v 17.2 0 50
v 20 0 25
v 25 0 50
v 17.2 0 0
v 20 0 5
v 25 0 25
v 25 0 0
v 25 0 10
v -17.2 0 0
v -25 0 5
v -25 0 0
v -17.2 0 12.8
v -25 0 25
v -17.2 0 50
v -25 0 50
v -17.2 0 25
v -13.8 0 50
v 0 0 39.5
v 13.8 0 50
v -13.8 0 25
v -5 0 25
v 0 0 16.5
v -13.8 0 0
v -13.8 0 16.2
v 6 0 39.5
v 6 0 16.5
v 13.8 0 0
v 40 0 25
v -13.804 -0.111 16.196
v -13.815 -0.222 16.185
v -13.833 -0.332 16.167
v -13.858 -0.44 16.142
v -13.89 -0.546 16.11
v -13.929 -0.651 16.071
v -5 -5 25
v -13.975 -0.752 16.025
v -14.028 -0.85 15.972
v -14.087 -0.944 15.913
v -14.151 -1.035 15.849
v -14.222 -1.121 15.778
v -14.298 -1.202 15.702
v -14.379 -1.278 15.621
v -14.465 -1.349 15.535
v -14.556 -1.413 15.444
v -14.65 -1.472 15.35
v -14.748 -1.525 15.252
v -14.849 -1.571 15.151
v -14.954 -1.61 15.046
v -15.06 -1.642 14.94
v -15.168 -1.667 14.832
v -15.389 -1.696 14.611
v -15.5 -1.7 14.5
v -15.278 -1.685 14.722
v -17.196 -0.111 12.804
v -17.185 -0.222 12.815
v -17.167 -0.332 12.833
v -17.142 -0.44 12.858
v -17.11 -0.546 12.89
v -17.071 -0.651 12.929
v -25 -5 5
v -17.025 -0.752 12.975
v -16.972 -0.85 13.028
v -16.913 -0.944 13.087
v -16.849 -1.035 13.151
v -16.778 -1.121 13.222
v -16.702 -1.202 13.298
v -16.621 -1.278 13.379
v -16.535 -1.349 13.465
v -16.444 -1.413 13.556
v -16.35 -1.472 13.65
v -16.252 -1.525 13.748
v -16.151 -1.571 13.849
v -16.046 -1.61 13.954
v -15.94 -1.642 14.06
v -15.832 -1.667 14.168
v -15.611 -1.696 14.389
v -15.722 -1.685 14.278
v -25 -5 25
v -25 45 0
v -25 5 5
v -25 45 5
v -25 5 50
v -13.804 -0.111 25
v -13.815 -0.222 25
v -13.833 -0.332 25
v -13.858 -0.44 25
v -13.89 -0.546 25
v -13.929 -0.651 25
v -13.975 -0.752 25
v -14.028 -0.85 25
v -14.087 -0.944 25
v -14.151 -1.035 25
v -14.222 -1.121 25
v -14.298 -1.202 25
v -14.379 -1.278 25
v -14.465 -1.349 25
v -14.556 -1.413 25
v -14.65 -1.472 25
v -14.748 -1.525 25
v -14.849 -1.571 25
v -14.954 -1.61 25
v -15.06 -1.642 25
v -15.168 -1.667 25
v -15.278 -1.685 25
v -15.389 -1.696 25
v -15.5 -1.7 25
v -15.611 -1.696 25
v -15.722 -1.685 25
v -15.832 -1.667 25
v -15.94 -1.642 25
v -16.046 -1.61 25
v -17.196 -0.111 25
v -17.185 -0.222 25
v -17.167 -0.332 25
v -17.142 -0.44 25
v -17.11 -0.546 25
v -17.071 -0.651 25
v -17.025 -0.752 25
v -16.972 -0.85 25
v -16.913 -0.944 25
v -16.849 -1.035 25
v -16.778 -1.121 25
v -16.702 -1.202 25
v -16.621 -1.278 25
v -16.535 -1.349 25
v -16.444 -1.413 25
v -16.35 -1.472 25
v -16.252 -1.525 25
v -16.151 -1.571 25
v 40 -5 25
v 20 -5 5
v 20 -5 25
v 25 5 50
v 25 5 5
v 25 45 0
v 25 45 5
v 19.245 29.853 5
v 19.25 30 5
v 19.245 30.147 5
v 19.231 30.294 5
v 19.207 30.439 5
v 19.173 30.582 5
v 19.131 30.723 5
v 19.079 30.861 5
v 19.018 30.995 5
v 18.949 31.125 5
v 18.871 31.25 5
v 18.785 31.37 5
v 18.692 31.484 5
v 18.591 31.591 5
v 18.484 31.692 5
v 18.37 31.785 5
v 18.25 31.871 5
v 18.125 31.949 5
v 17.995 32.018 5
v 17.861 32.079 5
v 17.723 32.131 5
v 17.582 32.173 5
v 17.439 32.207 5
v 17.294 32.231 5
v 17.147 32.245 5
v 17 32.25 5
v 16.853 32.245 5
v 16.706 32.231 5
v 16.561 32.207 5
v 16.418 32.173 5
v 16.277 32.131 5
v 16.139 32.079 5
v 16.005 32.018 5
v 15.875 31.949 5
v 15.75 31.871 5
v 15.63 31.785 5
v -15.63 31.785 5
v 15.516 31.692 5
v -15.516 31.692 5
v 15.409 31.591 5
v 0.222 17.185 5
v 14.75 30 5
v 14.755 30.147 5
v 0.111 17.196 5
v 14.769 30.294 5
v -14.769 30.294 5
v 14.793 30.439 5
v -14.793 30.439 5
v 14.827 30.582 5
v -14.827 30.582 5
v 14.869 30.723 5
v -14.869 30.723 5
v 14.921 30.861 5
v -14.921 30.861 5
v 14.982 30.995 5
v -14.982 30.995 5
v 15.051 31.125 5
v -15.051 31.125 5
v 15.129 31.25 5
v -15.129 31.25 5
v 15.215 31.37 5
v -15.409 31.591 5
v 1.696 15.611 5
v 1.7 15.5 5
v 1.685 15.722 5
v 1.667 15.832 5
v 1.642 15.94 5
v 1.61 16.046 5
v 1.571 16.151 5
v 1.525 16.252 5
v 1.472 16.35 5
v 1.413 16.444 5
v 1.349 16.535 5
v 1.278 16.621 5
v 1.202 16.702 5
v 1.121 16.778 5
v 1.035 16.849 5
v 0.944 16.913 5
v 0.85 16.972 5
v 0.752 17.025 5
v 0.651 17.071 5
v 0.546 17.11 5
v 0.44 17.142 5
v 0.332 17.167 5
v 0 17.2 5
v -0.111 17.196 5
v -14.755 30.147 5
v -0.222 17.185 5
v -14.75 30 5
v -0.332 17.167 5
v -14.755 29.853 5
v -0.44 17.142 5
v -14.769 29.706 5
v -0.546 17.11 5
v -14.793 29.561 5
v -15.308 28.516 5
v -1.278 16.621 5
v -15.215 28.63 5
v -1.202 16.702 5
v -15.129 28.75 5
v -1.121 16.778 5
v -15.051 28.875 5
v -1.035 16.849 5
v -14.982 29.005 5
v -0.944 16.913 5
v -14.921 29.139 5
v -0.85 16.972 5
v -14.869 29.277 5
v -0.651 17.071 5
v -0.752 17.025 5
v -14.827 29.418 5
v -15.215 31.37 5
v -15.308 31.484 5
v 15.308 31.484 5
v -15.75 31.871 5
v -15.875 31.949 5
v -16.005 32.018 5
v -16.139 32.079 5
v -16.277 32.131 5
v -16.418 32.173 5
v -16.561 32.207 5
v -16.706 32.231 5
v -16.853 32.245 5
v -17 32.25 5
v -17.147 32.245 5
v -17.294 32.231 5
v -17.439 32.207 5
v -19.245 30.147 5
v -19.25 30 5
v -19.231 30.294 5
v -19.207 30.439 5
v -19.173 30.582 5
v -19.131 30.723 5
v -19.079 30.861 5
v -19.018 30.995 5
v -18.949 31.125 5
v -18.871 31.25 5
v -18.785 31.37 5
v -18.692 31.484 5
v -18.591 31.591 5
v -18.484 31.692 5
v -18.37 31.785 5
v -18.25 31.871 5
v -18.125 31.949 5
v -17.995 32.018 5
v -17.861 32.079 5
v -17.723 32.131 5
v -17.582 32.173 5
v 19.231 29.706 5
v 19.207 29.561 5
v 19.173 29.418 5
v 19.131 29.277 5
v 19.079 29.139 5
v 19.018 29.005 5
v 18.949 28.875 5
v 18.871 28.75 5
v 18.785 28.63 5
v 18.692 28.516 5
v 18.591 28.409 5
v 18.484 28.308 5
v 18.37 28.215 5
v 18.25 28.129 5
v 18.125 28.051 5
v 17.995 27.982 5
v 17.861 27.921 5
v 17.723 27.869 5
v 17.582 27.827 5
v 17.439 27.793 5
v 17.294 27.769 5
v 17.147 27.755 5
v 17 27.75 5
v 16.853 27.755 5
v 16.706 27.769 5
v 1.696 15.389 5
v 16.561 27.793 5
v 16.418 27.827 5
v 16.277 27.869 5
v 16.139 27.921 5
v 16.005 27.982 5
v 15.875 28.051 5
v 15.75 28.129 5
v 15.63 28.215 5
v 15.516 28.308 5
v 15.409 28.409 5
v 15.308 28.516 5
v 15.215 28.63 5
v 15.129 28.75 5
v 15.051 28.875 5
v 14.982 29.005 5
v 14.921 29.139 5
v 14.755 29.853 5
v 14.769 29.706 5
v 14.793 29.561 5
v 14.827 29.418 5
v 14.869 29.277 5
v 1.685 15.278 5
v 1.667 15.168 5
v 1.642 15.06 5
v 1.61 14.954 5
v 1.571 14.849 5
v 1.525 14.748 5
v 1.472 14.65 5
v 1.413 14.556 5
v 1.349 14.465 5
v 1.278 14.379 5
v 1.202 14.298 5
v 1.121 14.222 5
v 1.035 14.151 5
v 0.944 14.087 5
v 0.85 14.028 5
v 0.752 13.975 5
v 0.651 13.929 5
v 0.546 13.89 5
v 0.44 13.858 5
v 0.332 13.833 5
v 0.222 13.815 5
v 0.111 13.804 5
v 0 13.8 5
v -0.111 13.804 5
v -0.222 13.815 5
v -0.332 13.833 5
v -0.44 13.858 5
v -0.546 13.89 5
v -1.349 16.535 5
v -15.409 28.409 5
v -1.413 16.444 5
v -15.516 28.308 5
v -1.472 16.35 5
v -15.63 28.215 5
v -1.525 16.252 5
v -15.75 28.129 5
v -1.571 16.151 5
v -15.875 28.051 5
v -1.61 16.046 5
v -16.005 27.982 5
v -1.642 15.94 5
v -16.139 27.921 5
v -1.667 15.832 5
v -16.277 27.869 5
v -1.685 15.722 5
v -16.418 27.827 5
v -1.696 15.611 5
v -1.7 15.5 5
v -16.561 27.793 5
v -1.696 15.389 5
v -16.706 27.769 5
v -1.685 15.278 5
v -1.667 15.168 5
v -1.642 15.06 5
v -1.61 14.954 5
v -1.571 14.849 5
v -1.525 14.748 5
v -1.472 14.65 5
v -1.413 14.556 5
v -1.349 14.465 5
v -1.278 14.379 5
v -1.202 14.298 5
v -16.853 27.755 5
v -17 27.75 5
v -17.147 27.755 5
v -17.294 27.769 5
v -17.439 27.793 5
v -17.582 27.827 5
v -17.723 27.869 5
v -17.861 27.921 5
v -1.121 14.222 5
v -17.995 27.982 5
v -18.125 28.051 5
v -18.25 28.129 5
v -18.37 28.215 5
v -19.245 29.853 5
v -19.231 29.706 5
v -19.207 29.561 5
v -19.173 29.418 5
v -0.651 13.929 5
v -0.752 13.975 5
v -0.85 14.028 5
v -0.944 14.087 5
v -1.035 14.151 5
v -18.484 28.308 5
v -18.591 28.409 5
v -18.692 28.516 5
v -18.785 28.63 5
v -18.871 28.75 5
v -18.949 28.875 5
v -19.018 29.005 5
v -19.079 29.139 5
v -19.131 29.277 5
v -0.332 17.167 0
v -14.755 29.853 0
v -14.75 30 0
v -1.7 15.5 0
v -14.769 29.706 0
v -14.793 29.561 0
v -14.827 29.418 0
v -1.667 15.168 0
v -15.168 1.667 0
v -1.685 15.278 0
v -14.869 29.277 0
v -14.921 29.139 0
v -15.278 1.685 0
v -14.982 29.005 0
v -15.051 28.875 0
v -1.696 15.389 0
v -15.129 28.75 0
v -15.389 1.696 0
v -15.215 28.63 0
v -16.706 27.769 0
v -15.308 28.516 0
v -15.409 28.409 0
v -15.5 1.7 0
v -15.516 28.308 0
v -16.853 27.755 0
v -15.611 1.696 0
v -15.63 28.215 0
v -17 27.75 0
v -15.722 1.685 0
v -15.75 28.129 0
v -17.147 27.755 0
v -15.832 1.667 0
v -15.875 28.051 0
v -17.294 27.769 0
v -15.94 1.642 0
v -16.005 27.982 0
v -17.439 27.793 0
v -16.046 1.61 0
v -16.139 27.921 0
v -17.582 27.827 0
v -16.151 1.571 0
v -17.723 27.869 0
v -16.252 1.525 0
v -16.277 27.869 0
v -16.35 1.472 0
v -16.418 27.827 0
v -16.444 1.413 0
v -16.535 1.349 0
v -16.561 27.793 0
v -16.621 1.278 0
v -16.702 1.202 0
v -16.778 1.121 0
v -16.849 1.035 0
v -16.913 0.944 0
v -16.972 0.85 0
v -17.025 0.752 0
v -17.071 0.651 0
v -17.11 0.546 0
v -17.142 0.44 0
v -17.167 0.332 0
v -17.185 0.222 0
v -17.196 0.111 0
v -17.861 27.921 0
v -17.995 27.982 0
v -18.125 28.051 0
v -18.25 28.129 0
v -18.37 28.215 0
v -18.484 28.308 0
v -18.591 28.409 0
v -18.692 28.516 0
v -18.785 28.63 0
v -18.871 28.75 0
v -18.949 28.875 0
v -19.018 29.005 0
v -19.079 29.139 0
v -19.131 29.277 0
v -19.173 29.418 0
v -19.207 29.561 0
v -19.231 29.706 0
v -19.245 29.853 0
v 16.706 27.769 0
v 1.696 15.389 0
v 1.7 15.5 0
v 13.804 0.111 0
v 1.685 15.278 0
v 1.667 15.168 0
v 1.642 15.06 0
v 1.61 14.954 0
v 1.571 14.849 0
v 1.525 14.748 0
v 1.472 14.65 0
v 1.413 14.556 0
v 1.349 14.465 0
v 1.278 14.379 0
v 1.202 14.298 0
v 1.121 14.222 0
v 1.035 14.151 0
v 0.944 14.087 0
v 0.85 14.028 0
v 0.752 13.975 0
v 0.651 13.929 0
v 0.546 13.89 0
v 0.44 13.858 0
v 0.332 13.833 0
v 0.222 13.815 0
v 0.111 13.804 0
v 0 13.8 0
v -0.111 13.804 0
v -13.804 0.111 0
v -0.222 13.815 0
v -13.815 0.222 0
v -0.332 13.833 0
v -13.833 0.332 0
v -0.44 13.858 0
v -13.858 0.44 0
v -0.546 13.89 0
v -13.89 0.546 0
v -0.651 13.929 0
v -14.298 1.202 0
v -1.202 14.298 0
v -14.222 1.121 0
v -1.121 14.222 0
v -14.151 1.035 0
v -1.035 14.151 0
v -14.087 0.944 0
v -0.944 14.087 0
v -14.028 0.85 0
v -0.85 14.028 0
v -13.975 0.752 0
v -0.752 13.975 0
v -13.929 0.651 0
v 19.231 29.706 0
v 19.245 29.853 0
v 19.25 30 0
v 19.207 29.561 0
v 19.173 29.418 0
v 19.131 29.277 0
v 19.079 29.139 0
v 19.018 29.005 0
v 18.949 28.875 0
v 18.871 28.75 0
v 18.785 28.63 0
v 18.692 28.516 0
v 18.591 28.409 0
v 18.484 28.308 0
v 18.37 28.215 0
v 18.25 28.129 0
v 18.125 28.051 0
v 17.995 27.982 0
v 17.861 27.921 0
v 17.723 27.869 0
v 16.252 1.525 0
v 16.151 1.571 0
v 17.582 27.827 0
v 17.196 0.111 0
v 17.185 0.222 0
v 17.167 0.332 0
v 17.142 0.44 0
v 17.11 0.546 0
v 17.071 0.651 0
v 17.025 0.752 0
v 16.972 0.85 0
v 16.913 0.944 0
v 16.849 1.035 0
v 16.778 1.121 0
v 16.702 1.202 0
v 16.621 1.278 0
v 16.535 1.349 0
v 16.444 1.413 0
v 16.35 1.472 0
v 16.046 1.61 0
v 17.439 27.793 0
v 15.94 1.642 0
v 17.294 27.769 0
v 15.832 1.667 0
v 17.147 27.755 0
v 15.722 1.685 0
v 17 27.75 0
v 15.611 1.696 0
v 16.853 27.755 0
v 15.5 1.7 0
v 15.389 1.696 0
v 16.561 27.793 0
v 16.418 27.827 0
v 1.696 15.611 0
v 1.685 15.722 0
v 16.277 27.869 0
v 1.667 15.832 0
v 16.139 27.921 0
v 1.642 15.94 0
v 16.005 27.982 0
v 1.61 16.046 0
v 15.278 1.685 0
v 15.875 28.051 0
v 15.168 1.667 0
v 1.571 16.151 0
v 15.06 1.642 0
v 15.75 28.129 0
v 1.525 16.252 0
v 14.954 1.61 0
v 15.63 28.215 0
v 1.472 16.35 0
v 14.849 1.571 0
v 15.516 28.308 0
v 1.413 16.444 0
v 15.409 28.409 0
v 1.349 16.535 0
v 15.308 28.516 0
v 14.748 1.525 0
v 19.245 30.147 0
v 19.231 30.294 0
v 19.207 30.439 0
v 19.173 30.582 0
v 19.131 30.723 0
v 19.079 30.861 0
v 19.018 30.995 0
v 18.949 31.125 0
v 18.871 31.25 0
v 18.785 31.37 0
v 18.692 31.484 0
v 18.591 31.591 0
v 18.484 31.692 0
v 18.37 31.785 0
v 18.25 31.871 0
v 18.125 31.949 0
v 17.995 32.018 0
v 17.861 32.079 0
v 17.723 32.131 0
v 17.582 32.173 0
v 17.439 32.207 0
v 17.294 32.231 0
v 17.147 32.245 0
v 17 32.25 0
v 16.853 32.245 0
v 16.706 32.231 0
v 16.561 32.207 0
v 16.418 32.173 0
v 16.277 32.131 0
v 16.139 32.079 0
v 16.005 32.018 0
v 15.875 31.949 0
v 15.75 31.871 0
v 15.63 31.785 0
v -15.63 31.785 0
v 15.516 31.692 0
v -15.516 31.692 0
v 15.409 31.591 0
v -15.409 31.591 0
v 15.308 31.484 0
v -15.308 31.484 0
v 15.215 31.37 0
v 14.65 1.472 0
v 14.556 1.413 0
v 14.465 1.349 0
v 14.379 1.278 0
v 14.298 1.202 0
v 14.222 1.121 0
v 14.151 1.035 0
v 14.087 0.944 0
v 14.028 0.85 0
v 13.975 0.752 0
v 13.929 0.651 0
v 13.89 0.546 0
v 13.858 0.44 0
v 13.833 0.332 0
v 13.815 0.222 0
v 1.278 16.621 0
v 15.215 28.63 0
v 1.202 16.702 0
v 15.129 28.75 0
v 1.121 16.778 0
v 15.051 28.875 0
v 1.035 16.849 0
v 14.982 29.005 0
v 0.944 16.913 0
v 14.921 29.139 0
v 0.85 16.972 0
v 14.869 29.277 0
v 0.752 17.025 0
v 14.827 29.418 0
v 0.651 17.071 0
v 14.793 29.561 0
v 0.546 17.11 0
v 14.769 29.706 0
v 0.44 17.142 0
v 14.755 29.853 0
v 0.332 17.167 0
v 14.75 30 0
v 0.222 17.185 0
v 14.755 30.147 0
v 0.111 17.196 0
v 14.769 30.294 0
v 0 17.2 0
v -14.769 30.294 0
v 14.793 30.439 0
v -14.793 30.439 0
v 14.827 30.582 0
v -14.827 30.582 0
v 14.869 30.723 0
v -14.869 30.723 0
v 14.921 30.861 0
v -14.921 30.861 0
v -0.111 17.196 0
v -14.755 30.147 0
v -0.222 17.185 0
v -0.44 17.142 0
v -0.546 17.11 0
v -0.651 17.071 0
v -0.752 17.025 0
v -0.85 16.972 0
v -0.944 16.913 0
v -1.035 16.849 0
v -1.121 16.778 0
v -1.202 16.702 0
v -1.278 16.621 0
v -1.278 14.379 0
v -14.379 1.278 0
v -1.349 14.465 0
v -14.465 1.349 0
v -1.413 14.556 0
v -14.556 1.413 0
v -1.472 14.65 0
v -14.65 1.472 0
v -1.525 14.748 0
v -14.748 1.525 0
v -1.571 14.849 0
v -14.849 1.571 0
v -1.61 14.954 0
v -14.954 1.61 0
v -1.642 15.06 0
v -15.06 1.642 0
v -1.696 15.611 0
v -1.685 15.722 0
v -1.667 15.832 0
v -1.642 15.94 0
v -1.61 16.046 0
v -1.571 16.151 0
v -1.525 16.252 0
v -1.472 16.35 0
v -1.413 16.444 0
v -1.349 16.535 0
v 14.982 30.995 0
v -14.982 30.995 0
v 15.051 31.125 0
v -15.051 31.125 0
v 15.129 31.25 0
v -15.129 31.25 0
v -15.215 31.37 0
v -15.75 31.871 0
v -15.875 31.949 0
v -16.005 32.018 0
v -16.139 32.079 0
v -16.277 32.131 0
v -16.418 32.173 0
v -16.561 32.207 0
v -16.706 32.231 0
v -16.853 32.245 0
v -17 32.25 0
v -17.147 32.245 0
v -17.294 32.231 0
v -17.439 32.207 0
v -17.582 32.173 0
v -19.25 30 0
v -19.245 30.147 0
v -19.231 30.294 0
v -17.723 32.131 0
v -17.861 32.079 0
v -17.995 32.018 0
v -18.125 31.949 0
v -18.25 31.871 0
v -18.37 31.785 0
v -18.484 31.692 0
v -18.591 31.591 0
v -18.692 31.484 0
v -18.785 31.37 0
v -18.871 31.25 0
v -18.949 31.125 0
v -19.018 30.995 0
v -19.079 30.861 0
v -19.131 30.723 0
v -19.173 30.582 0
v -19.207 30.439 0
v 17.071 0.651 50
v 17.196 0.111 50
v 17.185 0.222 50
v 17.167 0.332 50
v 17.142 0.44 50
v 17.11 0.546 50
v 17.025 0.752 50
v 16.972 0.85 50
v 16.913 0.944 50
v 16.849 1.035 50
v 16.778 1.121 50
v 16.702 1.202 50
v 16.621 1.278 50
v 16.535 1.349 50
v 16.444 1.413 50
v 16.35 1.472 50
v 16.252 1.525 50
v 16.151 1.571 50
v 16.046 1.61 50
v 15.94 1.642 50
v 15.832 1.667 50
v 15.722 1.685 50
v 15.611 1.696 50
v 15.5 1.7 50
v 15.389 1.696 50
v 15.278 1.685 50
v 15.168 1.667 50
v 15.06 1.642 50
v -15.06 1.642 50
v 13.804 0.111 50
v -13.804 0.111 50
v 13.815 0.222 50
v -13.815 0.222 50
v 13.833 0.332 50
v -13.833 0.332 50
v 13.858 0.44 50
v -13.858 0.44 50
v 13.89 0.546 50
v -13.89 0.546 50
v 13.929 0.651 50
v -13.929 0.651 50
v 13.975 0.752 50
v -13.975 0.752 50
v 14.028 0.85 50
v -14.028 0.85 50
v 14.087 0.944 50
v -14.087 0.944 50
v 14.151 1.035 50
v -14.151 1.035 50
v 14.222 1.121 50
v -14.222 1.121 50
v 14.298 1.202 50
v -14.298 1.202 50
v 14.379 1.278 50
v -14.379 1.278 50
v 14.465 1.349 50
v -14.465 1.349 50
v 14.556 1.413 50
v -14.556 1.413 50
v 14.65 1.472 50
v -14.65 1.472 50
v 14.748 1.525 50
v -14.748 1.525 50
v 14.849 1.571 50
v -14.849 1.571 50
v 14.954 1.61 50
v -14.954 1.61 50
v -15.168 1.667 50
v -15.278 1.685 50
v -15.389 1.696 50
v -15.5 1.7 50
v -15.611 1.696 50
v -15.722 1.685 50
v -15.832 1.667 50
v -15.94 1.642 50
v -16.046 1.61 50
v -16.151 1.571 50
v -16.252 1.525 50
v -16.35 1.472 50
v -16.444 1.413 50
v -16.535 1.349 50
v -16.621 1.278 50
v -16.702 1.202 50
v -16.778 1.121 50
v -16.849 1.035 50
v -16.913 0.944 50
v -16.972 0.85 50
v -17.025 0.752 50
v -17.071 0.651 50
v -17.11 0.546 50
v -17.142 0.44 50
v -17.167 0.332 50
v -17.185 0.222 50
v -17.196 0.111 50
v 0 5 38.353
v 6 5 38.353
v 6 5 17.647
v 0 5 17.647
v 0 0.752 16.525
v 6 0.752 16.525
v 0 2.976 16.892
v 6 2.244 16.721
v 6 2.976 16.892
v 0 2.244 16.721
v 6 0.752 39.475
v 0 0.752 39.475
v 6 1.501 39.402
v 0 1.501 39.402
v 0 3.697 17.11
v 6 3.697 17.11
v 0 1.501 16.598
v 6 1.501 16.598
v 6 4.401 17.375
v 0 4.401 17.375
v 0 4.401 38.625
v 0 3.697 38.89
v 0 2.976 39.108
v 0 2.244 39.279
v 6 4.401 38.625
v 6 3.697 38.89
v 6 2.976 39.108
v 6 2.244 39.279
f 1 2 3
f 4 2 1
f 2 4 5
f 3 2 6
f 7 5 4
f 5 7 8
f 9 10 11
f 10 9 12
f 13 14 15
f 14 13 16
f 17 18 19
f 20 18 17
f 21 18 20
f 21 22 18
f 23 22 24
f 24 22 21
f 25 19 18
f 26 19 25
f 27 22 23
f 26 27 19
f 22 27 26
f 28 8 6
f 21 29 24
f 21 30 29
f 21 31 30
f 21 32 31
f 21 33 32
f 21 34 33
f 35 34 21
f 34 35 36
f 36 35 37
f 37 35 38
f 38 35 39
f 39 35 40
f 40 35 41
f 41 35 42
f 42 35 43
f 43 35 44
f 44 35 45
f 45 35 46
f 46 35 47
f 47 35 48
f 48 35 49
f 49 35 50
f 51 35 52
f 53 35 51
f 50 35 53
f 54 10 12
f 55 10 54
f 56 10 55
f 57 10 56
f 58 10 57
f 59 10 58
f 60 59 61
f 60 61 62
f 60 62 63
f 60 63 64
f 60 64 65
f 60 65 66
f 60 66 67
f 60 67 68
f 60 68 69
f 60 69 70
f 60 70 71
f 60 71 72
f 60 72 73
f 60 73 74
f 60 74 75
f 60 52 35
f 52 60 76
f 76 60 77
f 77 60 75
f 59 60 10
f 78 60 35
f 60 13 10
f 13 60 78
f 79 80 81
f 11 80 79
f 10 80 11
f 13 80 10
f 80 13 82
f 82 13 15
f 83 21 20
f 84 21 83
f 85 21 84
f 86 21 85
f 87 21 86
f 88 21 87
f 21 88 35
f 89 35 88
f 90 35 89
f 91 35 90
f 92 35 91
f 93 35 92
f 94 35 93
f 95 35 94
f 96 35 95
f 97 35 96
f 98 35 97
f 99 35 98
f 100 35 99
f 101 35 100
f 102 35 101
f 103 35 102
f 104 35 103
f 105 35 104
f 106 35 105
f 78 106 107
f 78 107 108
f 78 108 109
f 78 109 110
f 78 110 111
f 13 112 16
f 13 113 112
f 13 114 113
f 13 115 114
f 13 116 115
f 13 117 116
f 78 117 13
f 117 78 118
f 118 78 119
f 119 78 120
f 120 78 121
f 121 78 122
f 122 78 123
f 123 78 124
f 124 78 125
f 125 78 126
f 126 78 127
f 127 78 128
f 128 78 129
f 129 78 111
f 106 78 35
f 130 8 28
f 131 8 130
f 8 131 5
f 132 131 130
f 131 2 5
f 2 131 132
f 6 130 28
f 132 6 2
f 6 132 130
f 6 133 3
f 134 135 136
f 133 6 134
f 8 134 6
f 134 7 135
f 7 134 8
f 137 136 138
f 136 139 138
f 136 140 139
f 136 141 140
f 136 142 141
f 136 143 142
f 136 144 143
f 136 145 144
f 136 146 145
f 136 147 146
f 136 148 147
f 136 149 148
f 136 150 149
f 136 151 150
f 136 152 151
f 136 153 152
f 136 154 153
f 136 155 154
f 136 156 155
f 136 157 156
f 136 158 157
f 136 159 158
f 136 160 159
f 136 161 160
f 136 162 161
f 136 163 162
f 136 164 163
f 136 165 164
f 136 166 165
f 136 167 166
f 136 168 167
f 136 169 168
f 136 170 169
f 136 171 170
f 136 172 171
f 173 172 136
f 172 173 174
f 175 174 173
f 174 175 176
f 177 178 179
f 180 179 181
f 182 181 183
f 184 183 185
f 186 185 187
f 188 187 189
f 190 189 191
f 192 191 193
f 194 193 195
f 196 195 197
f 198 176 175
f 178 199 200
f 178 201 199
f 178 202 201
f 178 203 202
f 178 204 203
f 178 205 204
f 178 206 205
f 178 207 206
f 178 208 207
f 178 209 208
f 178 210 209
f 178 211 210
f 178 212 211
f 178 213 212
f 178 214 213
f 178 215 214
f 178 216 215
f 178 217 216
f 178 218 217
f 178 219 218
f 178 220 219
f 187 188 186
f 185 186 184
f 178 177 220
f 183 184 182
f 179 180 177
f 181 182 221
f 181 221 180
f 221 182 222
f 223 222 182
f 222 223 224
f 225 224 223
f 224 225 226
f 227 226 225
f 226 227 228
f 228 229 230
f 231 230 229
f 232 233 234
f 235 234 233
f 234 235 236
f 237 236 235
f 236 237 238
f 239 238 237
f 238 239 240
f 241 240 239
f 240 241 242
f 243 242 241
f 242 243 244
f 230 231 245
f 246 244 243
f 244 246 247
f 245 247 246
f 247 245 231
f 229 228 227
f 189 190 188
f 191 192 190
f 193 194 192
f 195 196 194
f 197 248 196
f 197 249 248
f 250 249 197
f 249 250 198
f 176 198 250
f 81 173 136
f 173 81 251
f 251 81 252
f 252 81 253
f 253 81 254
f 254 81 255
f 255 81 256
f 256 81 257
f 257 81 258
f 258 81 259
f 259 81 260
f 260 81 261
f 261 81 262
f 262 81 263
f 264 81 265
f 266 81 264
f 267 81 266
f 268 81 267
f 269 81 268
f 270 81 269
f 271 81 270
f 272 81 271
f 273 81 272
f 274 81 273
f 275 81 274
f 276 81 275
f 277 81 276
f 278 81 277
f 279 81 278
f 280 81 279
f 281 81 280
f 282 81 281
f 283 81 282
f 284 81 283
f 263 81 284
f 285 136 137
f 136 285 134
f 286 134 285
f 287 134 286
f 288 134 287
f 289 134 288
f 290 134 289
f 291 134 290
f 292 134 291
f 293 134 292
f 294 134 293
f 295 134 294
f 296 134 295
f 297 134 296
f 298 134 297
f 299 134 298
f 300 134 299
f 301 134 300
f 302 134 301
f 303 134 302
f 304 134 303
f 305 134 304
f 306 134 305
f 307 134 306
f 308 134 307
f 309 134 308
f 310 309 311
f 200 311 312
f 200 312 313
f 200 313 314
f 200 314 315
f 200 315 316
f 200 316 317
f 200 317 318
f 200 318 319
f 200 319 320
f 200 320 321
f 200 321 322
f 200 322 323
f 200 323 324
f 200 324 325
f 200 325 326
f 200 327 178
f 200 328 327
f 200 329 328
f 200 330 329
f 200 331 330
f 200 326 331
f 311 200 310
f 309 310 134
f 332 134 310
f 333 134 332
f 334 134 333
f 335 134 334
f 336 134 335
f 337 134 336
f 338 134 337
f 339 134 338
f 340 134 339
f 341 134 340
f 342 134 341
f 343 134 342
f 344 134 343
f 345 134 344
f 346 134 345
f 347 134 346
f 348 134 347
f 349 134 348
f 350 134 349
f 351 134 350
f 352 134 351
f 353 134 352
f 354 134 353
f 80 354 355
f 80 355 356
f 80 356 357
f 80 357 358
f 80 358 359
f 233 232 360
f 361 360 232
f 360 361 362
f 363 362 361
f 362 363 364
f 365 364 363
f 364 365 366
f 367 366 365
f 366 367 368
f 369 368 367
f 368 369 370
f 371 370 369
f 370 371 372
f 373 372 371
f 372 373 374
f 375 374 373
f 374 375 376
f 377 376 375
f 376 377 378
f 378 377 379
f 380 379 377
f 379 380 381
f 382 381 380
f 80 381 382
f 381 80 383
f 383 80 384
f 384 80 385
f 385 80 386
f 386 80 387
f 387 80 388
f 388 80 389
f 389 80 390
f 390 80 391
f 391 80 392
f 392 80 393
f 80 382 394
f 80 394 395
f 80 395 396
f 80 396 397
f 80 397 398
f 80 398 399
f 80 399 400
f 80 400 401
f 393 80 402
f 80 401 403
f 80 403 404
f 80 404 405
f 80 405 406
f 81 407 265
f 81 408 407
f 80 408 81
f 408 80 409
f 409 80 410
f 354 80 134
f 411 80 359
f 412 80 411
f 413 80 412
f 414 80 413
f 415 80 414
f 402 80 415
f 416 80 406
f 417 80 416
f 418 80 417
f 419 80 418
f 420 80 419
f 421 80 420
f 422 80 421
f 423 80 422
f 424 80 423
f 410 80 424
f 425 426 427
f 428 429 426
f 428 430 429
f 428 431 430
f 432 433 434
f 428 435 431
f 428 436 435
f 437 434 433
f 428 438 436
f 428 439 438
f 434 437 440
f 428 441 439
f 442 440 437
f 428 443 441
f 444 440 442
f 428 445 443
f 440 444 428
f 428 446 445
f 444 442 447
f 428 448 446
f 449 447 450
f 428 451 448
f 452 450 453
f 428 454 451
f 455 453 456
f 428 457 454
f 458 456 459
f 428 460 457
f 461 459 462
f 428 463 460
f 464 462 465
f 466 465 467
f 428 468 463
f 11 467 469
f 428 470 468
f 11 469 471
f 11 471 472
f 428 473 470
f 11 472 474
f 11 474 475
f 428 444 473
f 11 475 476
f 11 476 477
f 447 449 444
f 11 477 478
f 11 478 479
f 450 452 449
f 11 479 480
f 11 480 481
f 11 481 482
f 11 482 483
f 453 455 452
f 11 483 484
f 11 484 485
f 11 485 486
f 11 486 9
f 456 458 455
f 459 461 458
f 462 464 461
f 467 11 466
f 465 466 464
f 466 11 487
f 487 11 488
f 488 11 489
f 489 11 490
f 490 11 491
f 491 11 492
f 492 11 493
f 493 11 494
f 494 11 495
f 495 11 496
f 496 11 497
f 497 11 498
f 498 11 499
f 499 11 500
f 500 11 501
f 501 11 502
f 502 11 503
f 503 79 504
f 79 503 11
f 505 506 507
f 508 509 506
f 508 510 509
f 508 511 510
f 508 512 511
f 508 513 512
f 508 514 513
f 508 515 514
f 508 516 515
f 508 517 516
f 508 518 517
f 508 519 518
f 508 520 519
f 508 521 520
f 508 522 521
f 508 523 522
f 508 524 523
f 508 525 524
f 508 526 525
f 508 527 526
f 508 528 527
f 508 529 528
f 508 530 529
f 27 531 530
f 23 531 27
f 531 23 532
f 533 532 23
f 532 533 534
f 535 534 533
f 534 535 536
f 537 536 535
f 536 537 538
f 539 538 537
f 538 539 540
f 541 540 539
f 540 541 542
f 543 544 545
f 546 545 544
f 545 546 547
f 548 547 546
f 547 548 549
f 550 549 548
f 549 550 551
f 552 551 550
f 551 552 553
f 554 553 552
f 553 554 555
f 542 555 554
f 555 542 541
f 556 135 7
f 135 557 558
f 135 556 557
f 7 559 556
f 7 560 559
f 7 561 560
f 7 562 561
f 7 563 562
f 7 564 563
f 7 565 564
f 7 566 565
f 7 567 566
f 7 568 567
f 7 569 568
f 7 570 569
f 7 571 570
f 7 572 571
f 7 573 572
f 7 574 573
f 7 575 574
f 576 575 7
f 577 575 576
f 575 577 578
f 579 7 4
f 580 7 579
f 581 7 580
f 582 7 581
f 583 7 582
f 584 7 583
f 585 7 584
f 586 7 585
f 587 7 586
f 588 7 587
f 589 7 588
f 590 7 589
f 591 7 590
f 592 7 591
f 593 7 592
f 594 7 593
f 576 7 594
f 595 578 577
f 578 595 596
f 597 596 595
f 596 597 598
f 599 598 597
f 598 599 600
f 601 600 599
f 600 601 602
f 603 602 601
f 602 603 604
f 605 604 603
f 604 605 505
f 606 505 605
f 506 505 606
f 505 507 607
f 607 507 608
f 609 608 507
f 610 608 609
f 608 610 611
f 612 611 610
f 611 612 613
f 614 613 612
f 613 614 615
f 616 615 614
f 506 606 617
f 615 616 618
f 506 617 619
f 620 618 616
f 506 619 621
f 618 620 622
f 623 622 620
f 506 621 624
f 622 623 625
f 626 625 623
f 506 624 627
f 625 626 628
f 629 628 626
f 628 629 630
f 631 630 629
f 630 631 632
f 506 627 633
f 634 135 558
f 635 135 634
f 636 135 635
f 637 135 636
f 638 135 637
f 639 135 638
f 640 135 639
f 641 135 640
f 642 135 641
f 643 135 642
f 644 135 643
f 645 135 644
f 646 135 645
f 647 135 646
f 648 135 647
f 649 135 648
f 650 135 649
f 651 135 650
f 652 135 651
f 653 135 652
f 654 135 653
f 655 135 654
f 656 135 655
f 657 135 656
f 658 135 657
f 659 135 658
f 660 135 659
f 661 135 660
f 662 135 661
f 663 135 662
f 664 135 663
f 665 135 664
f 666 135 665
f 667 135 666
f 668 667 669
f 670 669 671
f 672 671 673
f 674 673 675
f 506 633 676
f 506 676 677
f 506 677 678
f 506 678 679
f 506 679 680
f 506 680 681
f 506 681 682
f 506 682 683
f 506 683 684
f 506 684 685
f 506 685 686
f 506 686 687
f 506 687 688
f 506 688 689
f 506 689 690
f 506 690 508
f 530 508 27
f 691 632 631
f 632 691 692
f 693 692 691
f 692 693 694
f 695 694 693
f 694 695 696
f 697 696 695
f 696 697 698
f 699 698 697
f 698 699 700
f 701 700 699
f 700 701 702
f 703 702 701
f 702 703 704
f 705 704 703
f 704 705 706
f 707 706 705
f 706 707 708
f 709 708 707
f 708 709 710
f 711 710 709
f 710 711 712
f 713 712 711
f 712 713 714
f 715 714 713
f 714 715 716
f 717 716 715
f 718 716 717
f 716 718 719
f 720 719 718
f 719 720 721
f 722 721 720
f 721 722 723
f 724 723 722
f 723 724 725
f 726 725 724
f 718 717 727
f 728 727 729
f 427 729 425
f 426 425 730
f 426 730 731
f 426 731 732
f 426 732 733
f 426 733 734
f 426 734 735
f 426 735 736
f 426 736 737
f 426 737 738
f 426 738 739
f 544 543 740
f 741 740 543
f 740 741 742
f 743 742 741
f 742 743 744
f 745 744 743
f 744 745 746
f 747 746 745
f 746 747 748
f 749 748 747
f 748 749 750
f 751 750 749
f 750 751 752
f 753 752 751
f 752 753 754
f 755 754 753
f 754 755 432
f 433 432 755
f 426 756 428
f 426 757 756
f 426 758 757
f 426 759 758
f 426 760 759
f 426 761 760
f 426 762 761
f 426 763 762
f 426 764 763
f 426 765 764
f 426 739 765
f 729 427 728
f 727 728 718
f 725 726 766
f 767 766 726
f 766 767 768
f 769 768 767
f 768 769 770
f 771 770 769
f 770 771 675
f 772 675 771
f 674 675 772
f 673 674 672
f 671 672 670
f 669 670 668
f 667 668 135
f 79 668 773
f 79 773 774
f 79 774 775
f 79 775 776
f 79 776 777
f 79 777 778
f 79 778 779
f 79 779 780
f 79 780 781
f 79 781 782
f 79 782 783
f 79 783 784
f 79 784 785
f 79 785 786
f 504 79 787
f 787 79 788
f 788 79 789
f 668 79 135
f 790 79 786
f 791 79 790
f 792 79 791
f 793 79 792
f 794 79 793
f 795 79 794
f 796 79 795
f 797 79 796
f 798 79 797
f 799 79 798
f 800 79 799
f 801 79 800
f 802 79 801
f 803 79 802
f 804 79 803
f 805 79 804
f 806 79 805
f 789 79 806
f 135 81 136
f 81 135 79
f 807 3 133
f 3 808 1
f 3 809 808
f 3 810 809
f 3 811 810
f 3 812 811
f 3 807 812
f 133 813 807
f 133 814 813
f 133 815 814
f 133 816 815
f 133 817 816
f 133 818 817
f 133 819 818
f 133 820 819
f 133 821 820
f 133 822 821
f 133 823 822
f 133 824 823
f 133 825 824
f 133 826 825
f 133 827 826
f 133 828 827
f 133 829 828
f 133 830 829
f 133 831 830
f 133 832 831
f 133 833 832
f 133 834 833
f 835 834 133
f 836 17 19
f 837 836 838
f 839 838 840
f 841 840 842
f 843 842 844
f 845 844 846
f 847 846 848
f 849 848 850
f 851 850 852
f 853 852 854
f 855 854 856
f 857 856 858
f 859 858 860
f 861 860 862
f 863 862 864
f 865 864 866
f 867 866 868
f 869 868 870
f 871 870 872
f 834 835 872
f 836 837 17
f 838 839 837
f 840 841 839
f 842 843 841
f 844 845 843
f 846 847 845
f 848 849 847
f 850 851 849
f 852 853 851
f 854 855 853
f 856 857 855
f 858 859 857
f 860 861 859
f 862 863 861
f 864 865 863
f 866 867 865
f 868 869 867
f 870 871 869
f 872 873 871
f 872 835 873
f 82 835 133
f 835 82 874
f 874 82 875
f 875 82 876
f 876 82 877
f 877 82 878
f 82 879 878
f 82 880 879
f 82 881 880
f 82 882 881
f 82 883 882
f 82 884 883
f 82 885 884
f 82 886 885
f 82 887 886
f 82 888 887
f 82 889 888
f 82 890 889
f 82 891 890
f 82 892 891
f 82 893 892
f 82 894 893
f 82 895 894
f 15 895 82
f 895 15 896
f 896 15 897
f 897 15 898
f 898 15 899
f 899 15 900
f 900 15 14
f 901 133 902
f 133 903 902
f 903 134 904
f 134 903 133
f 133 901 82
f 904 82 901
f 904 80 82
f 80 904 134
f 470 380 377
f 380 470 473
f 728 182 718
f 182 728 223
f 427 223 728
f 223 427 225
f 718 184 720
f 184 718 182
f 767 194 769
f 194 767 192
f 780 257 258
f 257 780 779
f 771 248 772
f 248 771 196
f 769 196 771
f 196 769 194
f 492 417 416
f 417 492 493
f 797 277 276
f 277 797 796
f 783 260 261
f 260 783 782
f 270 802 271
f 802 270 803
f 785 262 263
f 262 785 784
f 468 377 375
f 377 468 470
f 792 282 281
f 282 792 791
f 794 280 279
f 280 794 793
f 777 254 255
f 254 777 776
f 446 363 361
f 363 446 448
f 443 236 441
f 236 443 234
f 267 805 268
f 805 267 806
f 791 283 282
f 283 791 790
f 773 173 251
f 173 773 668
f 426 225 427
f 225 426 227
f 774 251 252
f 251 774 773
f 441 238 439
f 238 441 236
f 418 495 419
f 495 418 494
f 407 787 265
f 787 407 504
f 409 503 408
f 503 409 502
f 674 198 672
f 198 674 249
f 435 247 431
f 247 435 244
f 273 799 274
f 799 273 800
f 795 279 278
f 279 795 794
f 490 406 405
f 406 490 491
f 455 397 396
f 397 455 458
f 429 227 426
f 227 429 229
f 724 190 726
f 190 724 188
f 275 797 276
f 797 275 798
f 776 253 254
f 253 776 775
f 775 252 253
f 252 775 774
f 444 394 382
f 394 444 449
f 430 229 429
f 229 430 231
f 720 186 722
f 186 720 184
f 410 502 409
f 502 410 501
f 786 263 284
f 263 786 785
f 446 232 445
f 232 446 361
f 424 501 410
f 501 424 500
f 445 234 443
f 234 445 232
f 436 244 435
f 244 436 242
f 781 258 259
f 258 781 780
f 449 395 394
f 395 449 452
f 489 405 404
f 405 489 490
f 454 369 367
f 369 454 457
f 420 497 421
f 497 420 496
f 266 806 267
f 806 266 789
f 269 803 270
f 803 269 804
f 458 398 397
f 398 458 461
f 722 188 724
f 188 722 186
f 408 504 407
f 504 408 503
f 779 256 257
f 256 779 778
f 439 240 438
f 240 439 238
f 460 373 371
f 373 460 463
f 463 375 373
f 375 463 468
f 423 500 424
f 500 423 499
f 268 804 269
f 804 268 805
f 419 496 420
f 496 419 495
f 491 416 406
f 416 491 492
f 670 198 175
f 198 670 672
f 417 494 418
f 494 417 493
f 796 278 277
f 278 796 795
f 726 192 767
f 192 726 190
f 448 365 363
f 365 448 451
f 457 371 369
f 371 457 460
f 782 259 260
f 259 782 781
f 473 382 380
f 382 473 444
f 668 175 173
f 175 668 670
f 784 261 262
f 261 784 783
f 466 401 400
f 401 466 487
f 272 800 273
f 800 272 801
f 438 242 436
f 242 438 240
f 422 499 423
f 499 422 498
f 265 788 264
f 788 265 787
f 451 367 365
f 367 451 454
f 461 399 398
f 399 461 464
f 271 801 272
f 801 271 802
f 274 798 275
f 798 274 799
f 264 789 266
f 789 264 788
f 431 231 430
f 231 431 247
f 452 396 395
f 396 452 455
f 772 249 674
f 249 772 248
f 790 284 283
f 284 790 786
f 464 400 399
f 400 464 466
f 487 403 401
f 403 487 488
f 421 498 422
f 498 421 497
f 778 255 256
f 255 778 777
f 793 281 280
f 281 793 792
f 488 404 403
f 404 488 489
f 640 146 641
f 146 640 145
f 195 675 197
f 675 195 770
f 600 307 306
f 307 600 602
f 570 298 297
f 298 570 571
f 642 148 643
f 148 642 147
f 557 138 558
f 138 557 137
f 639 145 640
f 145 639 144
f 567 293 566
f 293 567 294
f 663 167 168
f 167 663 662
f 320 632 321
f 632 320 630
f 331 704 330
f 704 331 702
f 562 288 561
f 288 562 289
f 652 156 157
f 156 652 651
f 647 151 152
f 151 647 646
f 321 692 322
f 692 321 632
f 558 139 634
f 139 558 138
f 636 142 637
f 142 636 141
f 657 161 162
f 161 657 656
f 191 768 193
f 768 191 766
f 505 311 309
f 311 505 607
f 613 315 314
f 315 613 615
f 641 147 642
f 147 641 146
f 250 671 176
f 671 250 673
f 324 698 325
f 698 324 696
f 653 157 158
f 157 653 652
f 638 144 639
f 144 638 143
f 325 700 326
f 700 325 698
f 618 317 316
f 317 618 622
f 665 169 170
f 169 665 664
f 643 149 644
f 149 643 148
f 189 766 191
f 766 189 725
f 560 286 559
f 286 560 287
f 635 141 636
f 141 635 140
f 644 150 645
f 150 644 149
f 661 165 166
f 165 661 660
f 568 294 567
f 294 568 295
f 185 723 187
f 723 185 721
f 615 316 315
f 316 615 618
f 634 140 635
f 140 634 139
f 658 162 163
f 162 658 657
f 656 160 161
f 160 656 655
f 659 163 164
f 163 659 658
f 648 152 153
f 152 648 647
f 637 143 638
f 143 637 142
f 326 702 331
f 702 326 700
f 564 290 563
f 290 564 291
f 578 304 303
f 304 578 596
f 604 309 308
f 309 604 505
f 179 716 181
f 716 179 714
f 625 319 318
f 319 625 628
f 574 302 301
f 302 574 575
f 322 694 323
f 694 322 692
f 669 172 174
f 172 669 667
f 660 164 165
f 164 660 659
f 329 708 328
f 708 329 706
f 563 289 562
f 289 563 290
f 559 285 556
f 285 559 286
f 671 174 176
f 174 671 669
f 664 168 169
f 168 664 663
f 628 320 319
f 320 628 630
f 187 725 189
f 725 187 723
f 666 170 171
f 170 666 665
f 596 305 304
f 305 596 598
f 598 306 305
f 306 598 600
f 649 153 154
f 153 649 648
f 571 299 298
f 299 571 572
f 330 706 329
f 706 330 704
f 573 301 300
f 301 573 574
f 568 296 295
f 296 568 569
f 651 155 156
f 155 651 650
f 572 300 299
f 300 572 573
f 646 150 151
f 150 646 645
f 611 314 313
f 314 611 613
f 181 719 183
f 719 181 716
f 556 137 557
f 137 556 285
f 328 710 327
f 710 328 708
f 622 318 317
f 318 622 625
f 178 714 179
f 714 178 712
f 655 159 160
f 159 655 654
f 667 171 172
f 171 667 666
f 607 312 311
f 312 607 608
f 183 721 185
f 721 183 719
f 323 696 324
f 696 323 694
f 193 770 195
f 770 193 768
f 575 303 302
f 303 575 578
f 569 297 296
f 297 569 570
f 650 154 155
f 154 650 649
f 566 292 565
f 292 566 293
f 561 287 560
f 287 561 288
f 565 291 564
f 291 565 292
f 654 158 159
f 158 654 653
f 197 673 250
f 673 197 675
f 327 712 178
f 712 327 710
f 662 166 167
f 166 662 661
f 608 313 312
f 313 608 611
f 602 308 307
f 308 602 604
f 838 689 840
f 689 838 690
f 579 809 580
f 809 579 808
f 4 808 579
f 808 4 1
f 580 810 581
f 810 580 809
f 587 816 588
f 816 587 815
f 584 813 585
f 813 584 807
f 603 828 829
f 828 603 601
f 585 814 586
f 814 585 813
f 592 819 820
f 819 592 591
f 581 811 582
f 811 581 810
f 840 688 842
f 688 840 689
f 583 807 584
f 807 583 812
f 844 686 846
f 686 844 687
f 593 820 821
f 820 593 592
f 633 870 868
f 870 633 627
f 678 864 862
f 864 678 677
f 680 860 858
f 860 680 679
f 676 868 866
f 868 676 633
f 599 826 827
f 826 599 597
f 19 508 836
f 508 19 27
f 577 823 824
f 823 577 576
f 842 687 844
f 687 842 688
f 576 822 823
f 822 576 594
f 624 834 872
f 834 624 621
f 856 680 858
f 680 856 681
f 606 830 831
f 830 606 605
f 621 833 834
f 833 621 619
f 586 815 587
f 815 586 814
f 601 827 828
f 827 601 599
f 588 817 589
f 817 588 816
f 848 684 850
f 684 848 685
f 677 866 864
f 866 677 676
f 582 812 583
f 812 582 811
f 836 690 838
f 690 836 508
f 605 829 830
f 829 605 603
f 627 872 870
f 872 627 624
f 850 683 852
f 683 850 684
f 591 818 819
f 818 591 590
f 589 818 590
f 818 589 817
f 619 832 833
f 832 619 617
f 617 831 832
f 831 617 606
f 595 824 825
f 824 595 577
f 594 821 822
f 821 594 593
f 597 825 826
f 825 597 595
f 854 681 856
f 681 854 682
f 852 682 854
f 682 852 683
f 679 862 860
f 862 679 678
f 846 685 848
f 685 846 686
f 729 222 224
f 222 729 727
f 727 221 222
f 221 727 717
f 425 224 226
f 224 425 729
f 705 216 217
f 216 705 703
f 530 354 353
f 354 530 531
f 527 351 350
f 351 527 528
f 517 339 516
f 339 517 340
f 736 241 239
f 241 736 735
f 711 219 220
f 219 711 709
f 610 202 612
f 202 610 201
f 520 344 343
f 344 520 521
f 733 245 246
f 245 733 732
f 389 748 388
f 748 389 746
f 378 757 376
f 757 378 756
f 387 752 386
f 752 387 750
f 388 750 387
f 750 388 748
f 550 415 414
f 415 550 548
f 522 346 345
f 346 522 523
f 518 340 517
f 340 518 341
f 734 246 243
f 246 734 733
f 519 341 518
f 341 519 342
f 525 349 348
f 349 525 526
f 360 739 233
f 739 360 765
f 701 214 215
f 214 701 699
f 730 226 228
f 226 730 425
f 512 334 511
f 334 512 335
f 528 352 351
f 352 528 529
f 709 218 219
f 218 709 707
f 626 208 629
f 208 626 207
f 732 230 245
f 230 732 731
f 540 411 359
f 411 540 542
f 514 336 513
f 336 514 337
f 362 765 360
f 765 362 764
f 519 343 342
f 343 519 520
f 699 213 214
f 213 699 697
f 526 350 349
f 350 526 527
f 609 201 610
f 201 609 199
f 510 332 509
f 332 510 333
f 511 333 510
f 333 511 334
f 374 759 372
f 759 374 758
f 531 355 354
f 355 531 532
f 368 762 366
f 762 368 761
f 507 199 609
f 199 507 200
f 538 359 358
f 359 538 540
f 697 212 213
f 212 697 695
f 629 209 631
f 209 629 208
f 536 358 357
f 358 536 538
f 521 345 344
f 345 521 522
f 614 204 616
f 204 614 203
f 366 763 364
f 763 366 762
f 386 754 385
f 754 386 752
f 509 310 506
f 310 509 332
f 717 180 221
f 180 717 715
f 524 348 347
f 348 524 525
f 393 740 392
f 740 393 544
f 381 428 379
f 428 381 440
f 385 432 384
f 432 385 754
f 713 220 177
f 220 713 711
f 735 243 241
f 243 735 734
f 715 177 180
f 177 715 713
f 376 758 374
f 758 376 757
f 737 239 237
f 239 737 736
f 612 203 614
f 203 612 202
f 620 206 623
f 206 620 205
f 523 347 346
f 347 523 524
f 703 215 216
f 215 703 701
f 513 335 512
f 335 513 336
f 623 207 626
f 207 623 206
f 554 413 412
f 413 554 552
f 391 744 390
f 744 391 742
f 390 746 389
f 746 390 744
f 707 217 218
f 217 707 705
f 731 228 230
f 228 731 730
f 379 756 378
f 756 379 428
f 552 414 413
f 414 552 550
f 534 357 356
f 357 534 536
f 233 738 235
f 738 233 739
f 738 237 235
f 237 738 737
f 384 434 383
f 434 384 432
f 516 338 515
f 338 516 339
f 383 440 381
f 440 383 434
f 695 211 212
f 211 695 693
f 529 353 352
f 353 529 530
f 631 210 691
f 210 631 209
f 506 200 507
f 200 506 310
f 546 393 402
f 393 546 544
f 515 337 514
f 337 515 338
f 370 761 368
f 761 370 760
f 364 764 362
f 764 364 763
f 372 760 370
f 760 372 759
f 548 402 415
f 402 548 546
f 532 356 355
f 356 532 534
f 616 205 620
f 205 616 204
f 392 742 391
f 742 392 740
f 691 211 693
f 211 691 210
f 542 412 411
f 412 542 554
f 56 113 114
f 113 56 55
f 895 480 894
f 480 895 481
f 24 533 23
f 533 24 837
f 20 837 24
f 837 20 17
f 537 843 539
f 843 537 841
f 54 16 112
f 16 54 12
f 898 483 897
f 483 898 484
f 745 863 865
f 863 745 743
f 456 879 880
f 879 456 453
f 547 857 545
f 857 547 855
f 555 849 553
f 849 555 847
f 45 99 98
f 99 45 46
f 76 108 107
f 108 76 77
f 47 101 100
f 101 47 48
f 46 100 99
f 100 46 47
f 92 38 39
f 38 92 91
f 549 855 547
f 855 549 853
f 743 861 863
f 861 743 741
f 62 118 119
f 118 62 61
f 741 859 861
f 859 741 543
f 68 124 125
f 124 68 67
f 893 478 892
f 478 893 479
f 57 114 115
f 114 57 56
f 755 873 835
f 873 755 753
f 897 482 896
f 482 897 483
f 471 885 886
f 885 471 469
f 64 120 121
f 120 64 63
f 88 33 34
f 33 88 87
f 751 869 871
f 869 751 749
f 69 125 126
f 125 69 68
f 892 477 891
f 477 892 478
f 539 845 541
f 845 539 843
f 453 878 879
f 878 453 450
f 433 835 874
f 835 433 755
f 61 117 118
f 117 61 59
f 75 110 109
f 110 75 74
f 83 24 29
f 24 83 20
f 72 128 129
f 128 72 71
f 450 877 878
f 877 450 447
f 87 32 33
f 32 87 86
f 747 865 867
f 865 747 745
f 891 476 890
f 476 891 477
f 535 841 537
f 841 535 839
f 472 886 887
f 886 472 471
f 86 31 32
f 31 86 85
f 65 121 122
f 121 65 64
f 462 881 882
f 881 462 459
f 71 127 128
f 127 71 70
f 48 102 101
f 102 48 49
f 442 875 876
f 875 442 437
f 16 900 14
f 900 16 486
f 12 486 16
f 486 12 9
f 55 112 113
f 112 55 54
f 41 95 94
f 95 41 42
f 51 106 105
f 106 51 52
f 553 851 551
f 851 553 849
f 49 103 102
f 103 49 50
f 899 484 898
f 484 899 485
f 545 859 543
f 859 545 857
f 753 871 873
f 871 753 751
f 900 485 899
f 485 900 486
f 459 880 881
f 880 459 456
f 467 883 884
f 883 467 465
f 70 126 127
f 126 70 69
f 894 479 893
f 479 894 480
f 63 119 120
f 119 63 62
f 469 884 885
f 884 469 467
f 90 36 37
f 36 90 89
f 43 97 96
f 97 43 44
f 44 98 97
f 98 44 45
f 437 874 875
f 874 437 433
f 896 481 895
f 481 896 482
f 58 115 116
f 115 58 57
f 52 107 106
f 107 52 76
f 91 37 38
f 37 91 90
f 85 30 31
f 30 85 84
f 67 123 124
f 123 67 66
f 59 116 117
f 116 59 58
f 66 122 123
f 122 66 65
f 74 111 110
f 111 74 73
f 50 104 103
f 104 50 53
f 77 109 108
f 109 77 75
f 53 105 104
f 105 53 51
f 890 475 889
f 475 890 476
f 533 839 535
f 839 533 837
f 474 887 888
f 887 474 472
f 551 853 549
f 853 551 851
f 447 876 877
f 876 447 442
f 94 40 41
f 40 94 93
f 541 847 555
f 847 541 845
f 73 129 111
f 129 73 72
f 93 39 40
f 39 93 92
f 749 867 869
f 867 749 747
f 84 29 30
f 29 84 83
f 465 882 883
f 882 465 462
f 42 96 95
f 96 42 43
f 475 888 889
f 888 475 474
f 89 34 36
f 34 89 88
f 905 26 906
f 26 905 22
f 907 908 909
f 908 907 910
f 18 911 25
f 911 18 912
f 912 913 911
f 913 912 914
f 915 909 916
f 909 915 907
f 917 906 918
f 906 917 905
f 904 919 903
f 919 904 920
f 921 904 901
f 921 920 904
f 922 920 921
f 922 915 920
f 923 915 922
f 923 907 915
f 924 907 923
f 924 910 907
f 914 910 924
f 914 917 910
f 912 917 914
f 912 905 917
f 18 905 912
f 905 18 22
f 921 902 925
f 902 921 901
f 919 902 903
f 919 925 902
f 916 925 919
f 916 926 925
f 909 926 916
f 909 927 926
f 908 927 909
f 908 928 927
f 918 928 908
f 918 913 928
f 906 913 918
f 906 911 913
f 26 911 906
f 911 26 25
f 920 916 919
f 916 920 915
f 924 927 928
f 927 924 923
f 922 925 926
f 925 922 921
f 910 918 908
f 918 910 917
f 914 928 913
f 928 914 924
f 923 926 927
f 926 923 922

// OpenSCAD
// L-shaped mounting bracket for NEMA 17 stepper motor
// Print orientation: base plate on bed (z = 0), motor plate builds upward

// ---------- Parameters ----------
base_x      = 25;     // base plate half-width (X)
base_y      = 45;     // base plate length (Y)
base_z      = 5;      // base plate thickness (Z)

hole_x      = 17;     // M4 through-hole offset from centre (X)
hole_y      = 30;     // M4 through-hole offset from centre (Y)
hole_d      = 4.5;    // M4 hole diameter

motor_x     = 25;     // motor plate half-width (X)
motor_y     = 5;      // motor plate thickness (Y)
motor_z     = 50;     // motor plate height (Z)

boss_d      = 23;     // motor centring boss hole diameter
boss_x      = 0;      // boss hole centre X
boss_z      = 28;     // boss hole centre Z

screw_d     = 3.4;    // M3 screw hole diameter
screw_pat   = 31;     // square pattern size (X and Y)

gusset_t    = 5;      // gusset thickness (X)
gusset_l    = 20;     // gusset leg length (Y and Z)

eps         = 0.5;    // cutter overshoot past faces

$fn = 96;

// ---------- Model ----------
difference() {
    union() {
        // Base plate
        translate([-base_x, 0, 0])
            cube([2*base_x, base_y, base_z]);

        // Motor plate
        translate([-motor_x, 0, 0])
            cube([2*motor_x, motor_y, motor_z]);

        // Gussets (right triangle in YZ, flush with outer edges)
        for (sx = [-1, 1])
            translate([sx > 0 ? 20 : -25, 0, 0])
                rotate([90, 0, 0])
                    linear_extrude(height = gusset_t)
                        polygon([
                            [0, 5],
                            [0, 5 + gusset_l],
                            [gusset_l, 5 + gusset_l]
                        ]);
    }

    // Base plate through-holes
    for (sx = [-1, 1])
        translate([sx * hole_x, hole_y, -eps])
            cylinder(d = hole_d, h = base_z + 2*eps);

    // Motor plate boss hole (along Y)
    translate([boss_x, 0, boss_z])
        rotate([0, 90, 0])
            cylinder(d = boss_d, h = motor_y + 2*eps);

    // Screw holes on square pattern centred on boss
    for (a = [0, 90, 180, 270])
        rotate([0, 0, a])
            translate([screw_pat / 2, 0, 0])
                cylinder(d = screw_d, h = motor_z + 2*eps);
}
